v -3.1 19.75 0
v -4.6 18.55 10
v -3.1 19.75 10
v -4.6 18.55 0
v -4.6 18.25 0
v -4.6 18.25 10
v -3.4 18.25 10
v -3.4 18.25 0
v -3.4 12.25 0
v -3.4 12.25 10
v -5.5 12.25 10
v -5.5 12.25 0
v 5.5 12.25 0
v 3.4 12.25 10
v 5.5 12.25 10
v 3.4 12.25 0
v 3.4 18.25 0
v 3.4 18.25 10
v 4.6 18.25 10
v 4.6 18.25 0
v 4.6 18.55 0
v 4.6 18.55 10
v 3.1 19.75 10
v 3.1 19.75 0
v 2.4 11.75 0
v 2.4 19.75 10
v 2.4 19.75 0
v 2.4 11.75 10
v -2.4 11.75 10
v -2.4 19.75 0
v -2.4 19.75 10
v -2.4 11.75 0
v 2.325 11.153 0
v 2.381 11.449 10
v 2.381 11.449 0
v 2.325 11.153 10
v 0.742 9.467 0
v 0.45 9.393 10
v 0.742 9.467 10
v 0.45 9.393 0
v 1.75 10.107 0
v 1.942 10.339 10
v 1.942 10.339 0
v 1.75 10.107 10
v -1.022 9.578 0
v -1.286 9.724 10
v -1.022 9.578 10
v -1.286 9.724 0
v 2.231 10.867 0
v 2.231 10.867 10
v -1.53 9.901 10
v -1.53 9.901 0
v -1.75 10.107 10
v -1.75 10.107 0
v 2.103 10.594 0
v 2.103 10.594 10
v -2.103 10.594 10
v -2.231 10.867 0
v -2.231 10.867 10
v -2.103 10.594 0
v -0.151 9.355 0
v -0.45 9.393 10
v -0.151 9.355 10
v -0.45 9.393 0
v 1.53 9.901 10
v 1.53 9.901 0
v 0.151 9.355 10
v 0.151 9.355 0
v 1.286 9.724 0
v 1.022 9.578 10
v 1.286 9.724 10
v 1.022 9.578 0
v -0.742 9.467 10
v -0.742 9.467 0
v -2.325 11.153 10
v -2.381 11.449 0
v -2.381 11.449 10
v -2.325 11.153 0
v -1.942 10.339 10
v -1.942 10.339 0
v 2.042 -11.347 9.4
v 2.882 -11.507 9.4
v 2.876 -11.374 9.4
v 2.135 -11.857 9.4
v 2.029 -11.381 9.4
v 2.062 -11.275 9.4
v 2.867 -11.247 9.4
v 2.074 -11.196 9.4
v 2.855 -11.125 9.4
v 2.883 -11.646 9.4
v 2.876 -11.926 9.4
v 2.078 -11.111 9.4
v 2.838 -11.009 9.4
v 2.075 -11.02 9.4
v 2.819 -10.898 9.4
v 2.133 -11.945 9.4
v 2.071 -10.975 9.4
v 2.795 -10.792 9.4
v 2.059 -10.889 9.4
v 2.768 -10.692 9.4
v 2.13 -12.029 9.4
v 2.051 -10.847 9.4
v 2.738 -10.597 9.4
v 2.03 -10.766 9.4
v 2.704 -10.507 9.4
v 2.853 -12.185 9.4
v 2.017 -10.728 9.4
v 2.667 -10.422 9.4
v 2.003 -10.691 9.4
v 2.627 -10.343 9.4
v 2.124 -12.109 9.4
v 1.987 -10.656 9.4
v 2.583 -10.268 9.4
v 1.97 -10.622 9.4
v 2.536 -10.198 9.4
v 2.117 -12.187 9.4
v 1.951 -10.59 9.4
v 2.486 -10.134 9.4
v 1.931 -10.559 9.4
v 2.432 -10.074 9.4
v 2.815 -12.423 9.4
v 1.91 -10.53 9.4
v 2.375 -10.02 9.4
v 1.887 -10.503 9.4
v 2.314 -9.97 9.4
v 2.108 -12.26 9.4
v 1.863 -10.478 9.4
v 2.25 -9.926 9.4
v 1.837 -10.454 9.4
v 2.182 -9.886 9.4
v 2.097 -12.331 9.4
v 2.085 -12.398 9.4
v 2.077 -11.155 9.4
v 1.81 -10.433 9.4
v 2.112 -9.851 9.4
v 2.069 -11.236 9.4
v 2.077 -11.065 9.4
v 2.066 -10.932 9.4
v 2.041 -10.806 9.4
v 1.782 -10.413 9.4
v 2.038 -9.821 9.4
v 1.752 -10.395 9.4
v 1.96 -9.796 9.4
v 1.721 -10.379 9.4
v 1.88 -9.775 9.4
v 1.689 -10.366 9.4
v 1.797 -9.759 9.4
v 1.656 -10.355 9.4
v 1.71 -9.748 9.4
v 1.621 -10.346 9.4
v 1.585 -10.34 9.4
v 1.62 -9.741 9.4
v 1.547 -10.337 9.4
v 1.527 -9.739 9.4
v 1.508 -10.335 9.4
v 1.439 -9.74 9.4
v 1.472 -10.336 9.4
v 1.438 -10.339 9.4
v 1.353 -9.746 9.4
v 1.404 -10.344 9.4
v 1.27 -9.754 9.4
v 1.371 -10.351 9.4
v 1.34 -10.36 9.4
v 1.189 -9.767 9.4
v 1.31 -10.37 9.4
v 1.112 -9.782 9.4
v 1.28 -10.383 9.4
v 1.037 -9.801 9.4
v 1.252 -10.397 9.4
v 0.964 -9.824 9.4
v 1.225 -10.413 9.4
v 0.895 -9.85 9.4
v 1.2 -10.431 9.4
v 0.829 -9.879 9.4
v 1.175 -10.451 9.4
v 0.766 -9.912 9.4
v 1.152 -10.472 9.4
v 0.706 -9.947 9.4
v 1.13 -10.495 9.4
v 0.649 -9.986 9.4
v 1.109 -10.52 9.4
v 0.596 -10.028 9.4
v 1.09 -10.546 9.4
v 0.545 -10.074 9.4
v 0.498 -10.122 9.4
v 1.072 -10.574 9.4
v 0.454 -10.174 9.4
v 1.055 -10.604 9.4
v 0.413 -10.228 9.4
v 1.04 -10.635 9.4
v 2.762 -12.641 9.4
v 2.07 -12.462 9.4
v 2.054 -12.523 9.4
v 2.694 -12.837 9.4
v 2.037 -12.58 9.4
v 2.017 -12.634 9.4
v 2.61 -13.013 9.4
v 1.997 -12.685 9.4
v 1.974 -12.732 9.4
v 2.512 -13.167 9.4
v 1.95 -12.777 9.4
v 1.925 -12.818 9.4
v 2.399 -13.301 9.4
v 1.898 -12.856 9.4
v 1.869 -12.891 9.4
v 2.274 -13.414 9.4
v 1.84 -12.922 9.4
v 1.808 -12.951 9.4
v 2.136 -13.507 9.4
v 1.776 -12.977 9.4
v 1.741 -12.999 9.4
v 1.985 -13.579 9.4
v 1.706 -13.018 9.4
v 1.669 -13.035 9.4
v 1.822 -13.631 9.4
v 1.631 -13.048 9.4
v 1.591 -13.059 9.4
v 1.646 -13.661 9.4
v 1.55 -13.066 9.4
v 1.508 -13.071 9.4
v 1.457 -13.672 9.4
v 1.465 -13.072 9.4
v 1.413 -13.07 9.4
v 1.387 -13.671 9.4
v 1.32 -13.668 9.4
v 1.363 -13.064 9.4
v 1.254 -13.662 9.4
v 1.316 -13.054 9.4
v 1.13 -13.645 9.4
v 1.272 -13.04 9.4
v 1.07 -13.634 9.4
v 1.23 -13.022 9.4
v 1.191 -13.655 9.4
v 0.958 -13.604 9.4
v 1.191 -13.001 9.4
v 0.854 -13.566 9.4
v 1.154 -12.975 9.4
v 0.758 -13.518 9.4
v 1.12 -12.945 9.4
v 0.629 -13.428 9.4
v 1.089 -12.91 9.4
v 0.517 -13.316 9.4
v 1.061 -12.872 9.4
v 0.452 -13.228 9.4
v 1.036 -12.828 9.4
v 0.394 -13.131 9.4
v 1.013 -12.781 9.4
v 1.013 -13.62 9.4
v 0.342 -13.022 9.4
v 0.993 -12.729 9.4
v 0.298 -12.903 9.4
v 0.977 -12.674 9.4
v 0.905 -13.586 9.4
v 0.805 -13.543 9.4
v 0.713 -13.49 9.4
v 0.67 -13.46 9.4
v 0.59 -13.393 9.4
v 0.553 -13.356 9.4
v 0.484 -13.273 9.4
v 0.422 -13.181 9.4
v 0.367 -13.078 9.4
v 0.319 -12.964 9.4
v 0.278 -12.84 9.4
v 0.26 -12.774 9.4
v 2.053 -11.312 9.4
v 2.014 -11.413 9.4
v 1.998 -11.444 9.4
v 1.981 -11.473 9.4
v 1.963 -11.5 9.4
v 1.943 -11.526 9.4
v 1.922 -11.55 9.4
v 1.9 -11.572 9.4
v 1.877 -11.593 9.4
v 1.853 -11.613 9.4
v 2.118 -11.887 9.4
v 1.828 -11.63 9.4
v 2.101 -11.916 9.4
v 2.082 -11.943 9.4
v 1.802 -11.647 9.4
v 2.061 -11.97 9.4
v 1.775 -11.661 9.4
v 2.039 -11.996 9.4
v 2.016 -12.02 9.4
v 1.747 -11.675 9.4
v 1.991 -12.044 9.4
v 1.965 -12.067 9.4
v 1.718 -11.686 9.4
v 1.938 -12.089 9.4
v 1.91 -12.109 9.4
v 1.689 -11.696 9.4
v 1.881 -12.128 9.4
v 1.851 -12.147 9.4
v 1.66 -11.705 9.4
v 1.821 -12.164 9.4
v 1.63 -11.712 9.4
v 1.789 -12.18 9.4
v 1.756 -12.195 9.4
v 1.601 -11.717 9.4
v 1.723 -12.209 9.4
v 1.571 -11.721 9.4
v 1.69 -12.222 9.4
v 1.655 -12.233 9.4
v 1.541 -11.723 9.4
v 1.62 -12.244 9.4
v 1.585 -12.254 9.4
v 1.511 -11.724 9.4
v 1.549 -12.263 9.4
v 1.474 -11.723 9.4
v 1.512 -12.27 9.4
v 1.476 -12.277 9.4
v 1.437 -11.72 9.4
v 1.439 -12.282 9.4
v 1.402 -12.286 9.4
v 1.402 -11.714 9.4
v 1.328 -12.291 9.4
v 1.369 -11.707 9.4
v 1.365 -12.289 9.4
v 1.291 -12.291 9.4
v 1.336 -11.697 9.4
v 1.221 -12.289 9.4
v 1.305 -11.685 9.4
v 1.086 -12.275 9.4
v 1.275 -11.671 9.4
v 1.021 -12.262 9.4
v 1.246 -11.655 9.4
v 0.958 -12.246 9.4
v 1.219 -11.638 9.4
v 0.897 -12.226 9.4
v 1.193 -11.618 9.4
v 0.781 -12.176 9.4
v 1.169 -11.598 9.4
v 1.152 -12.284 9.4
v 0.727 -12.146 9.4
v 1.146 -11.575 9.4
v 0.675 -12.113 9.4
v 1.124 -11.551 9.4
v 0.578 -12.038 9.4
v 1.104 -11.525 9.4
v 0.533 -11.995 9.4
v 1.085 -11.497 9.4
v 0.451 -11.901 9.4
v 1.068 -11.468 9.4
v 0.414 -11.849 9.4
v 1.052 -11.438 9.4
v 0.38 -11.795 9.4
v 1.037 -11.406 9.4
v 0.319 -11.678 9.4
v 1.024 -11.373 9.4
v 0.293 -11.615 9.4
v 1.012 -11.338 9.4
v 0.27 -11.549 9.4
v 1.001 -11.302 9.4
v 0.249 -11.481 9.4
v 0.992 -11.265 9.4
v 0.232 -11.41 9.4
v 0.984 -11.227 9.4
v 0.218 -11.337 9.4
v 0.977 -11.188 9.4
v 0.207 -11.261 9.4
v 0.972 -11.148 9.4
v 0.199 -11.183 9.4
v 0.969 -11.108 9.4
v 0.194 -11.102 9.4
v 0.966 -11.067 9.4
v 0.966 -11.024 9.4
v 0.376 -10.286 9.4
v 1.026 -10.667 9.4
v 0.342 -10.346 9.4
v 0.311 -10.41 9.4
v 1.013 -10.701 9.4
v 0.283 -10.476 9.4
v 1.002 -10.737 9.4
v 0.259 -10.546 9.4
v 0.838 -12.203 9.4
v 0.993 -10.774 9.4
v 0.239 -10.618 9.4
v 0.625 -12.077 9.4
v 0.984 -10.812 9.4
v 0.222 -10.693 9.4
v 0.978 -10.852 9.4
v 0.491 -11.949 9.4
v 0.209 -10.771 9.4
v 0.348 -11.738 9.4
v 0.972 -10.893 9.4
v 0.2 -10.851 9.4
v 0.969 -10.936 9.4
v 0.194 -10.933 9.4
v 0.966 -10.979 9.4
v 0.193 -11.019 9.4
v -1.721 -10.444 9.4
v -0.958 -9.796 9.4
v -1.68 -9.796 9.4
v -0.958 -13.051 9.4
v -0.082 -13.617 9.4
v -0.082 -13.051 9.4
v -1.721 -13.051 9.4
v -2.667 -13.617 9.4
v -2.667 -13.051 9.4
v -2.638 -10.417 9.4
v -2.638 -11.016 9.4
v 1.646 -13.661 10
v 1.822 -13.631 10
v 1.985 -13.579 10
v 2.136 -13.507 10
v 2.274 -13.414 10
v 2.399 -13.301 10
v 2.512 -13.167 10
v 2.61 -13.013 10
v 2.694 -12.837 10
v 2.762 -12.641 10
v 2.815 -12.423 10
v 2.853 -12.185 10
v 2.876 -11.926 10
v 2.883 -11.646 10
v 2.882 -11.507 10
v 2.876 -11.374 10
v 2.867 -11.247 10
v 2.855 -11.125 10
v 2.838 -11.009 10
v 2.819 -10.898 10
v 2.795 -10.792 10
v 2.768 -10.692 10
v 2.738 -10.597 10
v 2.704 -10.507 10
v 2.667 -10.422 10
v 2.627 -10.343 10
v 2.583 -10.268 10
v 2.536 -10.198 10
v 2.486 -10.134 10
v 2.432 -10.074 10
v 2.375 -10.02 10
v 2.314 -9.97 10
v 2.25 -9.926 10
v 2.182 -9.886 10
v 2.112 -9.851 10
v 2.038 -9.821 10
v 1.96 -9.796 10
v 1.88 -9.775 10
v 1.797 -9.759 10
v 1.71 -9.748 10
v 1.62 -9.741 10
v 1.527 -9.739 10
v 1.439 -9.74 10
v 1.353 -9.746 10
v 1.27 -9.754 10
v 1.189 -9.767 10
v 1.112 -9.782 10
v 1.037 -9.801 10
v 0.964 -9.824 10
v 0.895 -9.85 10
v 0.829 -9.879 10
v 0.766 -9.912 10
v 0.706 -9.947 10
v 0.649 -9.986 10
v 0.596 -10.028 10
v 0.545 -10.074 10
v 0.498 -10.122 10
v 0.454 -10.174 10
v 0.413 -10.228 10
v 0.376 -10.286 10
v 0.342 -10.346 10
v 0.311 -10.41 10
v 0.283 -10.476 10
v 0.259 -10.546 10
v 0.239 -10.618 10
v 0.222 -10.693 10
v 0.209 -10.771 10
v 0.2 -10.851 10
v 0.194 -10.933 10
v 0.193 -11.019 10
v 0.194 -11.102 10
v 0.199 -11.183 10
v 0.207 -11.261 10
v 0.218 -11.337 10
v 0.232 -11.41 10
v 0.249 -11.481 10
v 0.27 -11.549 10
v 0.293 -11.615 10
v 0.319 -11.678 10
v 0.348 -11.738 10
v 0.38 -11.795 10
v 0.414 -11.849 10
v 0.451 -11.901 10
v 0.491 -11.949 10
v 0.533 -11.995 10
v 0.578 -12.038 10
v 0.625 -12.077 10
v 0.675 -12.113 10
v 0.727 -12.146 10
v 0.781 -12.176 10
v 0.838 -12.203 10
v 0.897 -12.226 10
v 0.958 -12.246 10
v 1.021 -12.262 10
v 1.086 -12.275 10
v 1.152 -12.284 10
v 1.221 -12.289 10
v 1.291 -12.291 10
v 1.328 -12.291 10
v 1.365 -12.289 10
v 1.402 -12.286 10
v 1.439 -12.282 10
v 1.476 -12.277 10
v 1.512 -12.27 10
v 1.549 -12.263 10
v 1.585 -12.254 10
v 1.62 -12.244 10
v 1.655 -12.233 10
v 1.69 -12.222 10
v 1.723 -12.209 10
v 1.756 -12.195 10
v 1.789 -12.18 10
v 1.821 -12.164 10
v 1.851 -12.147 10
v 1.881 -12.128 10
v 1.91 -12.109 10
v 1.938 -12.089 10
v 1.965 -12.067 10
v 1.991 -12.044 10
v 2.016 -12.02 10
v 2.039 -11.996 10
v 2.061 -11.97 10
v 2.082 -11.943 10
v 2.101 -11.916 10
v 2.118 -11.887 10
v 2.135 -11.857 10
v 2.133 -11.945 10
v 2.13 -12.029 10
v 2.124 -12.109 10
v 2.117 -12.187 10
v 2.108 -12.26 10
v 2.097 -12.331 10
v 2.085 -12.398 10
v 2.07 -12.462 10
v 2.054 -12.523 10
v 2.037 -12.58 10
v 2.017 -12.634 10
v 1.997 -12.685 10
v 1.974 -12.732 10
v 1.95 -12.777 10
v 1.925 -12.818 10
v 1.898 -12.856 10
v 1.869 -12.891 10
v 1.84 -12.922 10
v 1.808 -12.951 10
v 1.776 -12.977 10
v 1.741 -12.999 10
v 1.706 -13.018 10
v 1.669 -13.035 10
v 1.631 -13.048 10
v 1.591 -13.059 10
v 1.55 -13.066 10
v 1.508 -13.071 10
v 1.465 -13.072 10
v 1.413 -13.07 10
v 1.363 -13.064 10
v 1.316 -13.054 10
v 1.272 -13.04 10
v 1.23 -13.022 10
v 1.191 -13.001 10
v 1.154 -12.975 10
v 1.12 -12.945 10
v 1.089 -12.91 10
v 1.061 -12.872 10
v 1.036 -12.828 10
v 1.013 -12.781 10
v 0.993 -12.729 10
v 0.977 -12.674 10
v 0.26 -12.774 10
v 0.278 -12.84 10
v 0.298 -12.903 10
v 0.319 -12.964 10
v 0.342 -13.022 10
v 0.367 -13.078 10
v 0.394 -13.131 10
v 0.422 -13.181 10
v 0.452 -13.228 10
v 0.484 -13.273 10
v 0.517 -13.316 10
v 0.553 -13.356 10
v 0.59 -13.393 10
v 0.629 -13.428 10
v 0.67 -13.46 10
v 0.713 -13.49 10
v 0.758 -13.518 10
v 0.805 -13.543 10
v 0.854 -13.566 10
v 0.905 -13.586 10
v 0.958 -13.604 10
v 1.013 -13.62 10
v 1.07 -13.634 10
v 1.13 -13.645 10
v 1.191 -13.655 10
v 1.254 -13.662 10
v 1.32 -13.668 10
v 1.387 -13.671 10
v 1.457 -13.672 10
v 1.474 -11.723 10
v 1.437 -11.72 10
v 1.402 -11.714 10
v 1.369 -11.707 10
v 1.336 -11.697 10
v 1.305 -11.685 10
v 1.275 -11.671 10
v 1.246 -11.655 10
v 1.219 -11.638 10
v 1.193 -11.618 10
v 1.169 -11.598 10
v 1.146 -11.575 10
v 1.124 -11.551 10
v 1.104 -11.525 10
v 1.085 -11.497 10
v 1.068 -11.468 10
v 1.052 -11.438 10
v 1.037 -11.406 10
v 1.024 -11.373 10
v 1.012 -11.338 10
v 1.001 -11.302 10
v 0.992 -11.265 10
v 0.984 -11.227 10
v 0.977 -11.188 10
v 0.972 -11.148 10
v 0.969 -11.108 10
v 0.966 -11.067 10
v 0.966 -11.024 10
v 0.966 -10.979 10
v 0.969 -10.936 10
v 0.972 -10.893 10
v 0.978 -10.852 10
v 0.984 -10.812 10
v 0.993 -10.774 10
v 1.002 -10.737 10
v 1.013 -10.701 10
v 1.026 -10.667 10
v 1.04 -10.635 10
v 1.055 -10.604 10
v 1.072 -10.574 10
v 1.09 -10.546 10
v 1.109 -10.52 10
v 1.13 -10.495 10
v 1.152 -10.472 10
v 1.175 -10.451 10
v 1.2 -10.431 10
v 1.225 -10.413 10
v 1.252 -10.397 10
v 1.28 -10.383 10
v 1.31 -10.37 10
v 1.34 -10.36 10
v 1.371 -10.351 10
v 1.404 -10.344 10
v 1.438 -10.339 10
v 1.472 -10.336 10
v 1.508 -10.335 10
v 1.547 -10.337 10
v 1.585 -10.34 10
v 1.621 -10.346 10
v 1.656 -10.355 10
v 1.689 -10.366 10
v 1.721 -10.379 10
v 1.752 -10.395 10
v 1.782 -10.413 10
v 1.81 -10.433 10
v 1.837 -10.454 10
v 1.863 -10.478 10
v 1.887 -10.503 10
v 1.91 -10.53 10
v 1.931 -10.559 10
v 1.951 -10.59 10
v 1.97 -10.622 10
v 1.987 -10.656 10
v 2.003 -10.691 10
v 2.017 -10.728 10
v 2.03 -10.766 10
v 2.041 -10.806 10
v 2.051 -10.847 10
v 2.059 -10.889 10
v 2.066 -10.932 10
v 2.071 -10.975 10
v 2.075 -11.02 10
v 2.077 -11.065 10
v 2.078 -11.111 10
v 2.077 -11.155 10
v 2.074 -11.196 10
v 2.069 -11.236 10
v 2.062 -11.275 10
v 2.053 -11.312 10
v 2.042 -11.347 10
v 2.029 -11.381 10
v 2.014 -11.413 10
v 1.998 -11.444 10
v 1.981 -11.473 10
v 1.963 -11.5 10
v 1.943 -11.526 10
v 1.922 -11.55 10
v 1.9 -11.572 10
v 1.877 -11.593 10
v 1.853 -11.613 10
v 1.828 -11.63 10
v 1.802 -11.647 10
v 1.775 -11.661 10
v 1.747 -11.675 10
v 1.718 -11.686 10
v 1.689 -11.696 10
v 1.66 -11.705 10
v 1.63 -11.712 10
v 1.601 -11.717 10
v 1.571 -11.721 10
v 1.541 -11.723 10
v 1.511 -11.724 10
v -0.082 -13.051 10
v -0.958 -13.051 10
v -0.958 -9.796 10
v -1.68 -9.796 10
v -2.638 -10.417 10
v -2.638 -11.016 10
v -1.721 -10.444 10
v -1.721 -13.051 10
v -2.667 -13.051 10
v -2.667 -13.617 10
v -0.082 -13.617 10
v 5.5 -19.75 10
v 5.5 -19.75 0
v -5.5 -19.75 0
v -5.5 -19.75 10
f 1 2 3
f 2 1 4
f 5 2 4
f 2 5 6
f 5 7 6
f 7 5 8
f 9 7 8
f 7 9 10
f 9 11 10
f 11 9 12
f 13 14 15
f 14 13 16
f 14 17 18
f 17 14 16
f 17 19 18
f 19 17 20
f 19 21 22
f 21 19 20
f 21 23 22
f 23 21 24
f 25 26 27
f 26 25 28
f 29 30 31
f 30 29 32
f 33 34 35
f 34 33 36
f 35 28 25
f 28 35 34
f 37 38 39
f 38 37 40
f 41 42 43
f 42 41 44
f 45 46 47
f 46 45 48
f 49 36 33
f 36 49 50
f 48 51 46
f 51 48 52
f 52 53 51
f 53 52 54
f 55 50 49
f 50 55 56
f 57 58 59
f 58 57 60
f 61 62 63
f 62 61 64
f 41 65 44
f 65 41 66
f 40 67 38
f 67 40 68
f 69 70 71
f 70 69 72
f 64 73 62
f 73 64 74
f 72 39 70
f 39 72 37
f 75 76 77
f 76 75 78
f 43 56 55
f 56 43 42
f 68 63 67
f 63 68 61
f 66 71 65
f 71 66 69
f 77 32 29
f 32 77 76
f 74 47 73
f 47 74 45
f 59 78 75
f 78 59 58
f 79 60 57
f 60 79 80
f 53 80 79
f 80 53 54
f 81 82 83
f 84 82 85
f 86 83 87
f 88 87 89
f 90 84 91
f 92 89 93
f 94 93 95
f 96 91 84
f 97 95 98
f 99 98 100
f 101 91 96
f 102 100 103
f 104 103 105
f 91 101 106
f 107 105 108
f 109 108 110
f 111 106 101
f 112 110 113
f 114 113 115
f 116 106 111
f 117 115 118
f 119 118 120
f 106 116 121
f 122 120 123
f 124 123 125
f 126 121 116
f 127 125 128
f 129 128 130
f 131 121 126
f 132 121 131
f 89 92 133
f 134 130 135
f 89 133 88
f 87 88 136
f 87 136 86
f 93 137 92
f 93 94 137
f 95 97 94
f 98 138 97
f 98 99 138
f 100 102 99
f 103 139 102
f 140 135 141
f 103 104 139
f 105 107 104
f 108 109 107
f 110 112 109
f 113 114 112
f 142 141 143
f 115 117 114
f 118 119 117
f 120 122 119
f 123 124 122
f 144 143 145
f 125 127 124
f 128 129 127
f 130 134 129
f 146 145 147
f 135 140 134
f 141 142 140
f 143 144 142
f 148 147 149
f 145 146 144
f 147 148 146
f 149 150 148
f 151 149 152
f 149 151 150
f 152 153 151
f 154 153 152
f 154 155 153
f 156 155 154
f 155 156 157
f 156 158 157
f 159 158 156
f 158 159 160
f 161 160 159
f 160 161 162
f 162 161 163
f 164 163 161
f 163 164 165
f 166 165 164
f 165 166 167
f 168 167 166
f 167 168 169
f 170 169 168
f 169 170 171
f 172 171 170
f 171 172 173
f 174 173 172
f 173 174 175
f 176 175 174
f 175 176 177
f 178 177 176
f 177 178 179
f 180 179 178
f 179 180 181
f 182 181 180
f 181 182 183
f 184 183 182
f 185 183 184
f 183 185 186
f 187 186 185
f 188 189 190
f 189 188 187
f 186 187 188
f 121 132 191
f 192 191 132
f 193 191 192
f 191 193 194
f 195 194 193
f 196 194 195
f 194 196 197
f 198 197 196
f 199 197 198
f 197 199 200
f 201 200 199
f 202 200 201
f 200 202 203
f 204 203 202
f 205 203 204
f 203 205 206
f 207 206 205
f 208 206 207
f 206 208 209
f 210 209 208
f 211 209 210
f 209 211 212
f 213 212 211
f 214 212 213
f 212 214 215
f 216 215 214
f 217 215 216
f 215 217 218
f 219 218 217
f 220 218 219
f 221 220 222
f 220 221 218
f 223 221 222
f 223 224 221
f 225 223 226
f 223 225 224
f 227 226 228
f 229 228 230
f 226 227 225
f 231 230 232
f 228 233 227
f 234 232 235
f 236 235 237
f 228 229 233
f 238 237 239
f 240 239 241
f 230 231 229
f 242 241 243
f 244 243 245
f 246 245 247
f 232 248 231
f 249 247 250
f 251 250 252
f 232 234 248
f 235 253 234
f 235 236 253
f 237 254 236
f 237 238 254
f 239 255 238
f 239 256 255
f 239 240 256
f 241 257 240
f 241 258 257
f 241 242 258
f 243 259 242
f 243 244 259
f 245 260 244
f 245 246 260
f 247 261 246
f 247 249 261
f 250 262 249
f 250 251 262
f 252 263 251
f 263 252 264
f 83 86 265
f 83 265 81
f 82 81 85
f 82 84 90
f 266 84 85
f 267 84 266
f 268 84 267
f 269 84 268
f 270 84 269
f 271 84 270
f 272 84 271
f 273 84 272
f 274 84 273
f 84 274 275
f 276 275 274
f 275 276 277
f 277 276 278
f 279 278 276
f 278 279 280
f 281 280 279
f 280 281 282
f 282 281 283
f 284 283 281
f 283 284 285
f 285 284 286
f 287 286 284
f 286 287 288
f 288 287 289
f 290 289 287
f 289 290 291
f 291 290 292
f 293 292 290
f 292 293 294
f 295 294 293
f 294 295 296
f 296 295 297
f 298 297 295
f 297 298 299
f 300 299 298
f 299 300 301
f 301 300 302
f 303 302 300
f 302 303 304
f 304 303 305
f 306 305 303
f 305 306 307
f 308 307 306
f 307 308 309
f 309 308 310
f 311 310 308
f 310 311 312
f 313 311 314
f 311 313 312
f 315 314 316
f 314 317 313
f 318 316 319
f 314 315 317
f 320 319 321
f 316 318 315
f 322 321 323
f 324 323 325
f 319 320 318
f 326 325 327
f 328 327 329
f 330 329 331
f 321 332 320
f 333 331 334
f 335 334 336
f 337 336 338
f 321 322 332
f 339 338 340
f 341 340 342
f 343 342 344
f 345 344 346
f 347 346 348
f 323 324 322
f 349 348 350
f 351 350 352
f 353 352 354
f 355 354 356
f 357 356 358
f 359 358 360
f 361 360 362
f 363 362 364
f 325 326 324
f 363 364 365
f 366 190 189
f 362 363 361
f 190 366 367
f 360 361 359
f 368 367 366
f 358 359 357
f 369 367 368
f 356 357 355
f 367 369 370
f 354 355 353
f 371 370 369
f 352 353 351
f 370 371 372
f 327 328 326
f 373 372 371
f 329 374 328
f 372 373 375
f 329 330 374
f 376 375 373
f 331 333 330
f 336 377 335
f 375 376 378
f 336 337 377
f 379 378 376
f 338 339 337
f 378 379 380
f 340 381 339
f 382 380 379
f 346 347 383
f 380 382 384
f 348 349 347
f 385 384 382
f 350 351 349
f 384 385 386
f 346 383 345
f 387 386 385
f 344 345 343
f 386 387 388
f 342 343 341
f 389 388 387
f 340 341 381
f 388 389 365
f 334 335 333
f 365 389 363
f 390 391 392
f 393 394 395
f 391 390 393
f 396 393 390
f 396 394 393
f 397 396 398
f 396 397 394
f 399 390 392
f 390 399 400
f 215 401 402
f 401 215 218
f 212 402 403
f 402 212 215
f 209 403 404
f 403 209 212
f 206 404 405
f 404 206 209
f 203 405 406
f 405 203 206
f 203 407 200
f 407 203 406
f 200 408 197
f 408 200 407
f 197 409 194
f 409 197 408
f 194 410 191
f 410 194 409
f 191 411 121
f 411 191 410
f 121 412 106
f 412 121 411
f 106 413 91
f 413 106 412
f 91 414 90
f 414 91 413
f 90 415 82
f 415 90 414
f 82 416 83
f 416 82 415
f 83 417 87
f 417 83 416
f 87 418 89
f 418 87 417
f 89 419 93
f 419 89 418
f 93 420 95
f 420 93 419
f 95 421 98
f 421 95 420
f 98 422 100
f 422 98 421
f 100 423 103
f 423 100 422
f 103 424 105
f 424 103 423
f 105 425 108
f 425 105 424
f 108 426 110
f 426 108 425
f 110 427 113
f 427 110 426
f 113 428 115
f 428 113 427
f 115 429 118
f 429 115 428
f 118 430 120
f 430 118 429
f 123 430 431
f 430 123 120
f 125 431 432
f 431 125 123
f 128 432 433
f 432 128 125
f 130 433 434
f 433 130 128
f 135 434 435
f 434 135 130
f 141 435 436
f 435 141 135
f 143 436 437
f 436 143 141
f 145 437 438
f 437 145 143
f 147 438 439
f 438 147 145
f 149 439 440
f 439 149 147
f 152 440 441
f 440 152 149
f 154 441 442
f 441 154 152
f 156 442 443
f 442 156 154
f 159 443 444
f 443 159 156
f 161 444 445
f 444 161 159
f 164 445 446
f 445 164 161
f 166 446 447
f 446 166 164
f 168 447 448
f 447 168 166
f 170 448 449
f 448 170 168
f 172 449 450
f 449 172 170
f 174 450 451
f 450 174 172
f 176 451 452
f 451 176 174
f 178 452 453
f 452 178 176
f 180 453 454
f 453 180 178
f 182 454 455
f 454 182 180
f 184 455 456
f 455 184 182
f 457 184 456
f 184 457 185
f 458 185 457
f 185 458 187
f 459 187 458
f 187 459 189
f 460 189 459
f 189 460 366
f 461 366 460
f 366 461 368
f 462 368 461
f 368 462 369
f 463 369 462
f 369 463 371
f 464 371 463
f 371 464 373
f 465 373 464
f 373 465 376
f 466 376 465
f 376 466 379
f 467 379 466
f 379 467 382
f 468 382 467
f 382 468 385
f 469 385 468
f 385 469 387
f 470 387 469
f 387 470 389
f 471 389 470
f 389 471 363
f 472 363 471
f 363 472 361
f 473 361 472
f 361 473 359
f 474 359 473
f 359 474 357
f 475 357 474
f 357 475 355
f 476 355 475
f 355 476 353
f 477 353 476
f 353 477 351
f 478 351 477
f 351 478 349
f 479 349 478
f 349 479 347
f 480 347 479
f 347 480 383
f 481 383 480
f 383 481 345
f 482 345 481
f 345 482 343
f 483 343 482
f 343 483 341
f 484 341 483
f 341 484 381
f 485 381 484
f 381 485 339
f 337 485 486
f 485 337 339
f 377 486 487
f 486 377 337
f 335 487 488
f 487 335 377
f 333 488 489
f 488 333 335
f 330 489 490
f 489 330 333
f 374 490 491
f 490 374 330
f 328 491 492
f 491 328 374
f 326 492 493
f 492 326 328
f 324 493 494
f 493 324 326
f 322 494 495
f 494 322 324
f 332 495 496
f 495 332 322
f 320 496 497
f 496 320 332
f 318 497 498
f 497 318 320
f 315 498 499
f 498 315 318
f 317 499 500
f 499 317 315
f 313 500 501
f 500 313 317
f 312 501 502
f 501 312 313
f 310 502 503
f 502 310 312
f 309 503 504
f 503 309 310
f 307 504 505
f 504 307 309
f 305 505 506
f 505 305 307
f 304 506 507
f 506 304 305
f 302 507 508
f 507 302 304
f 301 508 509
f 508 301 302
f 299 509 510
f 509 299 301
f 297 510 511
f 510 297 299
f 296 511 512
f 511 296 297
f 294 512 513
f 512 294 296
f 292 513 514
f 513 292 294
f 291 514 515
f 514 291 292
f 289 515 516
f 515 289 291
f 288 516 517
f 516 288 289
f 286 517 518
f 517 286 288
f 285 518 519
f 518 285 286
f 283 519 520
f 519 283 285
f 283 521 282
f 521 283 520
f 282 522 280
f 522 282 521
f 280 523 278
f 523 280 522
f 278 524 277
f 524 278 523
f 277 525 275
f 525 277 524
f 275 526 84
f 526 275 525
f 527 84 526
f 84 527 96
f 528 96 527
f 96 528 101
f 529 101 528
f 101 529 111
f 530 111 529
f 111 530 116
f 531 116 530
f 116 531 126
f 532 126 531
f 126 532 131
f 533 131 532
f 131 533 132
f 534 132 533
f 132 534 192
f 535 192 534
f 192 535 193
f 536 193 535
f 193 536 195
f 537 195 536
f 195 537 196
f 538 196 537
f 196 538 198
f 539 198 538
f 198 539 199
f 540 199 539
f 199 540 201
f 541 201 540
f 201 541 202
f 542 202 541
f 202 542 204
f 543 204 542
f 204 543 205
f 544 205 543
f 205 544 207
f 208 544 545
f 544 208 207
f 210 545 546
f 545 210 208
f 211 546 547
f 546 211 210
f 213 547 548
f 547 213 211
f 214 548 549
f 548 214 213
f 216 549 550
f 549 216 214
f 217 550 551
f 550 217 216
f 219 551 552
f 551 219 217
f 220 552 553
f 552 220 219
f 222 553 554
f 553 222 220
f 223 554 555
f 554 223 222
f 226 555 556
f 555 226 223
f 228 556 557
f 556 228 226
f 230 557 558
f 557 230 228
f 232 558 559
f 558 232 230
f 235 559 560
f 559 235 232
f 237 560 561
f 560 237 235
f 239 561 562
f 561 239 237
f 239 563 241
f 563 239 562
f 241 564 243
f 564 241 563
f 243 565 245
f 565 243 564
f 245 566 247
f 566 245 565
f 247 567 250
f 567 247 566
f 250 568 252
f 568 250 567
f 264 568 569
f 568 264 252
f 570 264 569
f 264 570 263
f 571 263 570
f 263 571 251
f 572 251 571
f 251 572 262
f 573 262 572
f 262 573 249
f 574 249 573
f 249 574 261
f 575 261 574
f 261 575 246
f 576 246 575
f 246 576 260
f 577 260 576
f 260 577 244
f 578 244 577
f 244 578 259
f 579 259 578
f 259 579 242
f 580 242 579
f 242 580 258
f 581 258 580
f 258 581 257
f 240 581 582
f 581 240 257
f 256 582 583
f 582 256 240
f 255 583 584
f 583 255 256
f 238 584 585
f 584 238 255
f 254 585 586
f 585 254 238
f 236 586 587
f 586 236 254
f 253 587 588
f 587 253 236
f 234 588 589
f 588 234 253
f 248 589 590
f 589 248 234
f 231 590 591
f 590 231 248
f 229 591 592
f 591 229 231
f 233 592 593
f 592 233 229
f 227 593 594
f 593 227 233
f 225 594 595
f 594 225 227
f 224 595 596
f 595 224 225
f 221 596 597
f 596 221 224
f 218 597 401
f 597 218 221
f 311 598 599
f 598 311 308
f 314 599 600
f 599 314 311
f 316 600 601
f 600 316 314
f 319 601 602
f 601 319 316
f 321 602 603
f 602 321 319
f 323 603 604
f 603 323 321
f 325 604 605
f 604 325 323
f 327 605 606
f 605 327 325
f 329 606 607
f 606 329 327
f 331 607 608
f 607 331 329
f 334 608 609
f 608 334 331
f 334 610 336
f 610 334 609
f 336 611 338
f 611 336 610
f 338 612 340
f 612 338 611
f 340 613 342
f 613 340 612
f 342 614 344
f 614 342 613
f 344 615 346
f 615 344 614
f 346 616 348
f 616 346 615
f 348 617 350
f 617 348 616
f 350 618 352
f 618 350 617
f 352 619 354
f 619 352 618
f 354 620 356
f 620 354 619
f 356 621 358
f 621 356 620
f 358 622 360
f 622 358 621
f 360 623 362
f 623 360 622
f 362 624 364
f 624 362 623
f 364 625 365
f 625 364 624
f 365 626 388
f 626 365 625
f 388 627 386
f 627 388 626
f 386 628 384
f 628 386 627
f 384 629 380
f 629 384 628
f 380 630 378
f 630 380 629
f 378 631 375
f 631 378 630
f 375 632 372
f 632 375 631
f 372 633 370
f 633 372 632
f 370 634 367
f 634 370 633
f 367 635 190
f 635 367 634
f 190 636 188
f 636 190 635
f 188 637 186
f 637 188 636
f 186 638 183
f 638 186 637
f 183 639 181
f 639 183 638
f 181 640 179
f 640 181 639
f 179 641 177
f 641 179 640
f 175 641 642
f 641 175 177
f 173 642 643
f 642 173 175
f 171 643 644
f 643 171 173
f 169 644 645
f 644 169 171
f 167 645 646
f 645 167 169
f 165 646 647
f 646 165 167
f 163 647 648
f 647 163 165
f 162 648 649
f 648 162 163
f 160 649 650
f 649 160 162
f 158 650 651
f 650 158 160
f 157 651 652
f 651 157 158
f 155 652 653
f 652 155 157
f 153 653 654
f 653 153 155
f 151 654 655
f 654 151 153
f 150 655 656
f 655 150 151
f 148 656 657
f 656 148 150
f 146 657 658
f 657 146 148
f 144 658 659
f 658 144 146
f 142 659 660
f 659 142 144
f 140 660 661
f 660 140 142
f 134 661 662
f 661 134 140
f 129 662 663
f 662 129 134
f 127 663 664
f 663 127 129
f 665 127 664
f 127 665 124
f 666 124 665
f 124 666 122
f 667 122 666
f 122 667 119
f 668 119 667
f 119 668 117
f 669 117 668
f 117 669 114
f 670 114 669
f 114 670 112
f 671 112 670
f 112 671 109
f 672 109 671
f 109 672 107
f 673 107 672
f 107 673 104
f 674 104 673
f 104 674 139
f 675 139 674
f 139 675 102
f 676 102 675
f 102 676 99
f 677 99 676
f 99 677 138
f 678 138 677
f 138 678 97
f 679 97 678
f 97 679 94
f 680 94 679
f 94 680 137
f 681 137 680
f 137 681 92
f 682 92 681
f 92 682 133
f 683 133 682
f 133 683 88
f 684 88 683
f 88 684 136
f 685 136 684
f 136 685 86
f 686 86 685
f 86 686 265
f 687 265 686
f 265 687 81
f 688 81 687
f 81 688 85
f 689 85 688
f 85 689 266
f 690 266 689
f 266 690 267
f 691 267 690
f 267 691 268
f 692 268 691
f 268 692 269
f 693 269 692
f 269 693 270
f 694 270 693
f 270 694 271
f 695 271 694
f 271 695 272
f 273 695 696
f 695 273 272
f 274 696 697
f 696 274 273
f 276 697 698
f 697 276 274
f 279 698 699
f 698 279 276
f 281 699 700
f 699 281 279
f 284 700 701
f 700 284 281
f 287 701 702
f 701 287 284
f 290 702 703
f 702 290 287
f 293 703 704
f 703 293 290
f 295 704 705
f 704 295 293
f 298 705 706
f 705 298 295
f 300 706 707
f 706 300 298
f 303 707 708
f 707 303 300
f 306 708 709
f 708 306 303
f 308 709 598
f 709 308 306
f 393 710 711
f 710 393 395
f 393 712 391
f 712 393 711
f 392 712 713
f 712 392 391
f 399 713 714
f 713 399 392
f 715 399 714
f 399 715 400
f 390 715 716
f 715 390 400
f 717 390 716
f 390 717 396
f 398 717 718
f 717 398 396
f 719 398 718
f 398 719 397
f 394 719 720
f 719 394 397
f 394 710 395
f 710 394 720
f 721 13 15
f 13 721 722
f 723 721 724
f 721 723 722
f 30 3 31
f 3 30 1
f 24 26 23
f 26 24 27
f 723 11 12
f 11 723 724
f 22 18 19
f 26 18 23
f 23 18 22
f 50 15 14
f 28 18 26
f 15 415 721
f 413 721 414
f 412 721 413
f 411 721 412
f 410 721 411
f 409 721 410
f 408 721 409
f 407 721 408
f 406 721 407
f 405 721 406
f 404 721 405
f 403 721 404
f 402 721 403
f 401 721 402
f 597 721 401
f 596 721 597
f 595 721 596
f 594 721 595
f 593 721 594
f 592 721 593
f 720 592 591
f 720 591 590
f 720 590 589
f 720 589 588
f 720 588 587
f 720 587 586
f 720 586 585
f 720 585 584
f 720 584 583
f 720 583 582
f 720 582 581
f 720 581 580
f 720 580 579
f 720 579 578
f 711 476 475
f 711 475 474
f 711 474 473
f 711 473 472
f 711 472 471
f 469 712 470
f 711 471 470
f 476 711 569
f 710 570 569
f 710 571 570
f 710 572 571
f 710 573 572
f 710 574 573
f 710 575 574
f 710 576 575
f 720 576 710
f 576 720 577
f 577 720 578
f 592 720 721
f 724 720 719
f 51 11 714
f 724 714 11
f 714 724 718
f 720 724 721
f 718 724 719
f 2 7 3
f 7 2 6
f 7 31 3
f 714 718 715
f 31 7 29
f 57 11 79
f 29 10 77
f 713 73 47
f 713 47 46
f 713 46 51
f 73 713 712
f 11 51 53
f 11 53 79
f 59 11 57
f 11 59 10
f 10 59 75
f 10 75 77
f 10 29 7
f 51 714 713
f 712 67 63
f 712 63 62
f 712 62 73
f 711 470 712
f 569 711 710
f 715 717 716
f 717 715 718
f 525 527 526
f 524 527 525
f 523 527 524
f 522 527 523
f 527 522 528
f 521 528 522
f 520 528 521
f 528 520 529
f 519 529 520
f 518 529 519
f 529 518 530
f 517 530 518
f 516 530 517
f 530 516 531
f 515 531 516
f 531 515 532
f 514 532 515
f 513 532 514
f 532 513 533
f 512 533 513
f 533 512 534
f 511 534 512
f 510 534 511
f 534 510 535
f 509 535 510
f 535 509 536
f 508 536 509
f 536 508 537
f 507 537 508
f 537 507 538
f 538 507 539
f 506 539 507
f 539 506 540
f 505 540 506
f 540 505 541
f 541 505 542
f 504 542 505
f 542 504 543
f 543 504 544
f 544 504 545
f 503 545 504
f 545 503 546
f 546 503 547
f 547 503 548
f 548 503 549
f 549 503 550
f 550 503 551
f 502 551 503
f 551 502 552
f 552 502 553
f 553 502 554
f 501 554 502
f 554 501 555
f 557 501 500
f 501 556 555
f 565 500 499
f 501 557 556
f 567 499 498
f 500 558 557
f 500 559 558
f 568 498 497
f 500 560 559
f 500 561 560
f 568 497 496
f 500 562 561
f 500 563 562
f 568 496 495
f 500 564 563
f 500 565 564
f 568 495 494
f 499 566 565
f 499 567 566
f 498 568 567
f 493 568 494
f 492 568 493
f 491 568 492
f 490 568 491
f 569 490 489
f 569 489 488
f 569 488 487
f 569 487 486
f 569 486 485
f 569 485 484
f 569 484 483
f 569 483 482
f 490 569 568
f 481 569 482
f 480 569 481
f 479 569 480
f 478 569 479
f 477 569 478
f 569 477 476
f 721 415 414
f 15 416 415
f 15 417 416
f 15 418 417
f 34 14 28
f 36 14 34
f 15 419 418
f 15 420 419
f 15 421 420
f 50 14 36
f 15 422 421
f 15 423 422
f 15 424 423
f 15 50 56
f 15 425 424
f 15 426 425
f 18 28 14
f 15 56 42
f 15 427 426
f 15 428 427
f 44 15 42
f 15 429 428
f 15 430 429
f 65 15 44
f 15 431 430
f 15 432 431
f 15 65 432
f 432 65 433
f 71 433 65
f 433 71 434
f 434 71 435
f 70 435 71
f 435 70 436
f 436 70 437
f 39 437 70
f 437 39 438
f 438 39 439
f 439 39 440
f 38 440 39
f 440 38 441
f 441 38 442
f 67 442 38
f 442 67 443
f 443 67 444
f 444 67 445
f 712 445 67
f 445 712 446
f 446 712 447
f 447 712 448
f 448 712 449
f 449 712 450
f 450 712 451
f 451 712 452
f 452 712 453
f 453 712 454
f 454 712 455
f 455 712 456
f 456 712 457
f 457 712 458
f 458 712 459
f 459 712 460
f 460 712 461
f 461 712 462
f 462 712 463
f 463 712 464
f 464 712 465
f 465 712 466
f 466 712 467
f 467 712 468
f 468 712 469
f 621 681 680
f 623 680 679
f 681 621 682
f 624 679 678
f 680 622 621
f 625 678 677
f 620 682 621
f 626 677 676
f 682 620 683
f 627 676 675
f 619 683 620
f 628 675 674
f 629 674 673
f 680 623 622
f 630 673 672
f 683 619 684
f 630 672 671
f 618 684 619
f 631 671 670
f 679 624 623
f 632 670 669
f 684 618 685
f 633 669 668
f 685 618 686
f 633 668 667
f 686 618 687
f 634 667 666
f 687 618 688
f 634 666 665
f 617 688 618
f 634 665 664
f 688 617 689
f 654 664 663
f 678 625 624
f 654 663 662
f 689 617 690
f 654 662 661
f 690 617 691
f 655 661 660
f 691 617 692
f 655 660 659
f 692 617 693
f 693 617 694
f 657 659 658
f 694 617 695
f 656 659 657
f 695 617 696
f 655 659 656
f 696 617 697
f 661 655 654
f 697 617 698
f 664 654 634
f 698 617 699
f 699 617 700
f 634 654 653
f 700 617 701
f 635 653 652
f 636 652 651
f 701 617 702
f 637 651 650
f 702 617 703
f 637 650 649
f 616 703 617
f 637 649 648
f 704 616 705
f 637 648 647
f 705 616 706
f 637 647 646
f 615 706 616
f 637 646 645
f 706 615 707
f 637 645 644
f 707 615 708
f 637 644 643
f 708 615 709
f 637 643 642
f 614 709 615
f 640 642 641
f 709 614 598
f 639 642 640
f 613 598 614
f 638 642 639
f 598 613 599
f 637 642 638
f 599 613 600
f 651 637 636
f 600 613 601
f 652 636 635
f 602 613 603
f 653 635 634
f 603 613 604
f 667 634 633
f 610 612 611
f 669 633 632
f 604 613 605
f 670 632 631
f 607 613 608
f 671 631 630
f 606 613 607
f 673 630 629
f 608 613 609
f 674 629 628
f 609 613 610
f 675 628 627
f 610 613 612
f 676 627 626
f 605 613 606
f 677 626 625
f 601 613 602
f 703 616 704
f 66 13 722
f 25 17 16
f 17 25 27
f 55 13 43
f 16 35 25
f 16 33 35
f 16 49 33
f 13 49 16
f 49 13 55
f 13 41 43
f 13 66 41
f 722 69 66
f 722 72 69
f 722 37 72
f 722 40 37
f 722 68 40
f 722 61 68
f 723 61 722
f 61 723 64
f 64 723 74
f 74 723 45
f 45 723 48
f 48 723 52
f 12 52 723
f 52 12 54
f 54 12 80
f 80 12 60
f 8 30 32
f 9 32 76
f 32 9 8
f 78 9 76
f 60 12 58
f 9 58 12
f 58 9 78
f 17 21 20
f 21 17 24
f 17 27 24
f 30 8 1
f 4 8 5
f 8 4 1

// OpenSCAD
$fn = 50;

difference() {
	union() {
		translate(v = [0, 12.25, 0]) {
			rotate(a = [90, 0, 0]) {
				difference() {
					union() {
						translate(v = [-5.5, 0, -7.5]) {
							cube(size = [11.0, 10.0, 39.5]);
						}
					}
					union() {
						translate(v = [0, 10.1, 0]) {
							rotate(a = [90, 0, 0]) {
								linear_extrude(height = 10.2) {
									polygon(points = [[-3.1, -7.6], [-3.1, -7.5], [-4.6, -6.3], [-4.6, -6.0], [-3.4, -6.0], [-3.4, 0], [-5.6, 0], [-5.6, -7.6]]);
								}
							}
						}
						translate(v = [0, 10.1, 0]) {
							rotate(a = [90, 0, 0]) {
								linear_extrude(height = 10.2) {
									polygon(points = [[3.1, -7.6], [3.1, -7.5], [4.6, -6.3], [4.6, -6.0], [3.4, -6.0], [3.4, 0], [5.6, 0], [5.6, -7.6]]);
								}
							}
						}
						translate(v = [-2.4, -0.1, -7.6]) {
							cube(size = [4.8, 10.2, 8.1]);
						}
						translate(v = [0, 10.1, 0.5]) {
							rotate(a = [90, 0, 0]) {
								cylinder(h = 10.2, r = 2.4);
							}
						}
						translate(v = [0, 9.4, 24.0]) {
							rotate(a = [-90, 0, 0]) {
								linear_extrude(height = 0.7) {
									text(font = "Arial:style=Bold", halign = "center", size = 4.0, text = "19", valign = "center");
								}
							}
						}
					}
				}
			}
		}
	}
	union();
}
